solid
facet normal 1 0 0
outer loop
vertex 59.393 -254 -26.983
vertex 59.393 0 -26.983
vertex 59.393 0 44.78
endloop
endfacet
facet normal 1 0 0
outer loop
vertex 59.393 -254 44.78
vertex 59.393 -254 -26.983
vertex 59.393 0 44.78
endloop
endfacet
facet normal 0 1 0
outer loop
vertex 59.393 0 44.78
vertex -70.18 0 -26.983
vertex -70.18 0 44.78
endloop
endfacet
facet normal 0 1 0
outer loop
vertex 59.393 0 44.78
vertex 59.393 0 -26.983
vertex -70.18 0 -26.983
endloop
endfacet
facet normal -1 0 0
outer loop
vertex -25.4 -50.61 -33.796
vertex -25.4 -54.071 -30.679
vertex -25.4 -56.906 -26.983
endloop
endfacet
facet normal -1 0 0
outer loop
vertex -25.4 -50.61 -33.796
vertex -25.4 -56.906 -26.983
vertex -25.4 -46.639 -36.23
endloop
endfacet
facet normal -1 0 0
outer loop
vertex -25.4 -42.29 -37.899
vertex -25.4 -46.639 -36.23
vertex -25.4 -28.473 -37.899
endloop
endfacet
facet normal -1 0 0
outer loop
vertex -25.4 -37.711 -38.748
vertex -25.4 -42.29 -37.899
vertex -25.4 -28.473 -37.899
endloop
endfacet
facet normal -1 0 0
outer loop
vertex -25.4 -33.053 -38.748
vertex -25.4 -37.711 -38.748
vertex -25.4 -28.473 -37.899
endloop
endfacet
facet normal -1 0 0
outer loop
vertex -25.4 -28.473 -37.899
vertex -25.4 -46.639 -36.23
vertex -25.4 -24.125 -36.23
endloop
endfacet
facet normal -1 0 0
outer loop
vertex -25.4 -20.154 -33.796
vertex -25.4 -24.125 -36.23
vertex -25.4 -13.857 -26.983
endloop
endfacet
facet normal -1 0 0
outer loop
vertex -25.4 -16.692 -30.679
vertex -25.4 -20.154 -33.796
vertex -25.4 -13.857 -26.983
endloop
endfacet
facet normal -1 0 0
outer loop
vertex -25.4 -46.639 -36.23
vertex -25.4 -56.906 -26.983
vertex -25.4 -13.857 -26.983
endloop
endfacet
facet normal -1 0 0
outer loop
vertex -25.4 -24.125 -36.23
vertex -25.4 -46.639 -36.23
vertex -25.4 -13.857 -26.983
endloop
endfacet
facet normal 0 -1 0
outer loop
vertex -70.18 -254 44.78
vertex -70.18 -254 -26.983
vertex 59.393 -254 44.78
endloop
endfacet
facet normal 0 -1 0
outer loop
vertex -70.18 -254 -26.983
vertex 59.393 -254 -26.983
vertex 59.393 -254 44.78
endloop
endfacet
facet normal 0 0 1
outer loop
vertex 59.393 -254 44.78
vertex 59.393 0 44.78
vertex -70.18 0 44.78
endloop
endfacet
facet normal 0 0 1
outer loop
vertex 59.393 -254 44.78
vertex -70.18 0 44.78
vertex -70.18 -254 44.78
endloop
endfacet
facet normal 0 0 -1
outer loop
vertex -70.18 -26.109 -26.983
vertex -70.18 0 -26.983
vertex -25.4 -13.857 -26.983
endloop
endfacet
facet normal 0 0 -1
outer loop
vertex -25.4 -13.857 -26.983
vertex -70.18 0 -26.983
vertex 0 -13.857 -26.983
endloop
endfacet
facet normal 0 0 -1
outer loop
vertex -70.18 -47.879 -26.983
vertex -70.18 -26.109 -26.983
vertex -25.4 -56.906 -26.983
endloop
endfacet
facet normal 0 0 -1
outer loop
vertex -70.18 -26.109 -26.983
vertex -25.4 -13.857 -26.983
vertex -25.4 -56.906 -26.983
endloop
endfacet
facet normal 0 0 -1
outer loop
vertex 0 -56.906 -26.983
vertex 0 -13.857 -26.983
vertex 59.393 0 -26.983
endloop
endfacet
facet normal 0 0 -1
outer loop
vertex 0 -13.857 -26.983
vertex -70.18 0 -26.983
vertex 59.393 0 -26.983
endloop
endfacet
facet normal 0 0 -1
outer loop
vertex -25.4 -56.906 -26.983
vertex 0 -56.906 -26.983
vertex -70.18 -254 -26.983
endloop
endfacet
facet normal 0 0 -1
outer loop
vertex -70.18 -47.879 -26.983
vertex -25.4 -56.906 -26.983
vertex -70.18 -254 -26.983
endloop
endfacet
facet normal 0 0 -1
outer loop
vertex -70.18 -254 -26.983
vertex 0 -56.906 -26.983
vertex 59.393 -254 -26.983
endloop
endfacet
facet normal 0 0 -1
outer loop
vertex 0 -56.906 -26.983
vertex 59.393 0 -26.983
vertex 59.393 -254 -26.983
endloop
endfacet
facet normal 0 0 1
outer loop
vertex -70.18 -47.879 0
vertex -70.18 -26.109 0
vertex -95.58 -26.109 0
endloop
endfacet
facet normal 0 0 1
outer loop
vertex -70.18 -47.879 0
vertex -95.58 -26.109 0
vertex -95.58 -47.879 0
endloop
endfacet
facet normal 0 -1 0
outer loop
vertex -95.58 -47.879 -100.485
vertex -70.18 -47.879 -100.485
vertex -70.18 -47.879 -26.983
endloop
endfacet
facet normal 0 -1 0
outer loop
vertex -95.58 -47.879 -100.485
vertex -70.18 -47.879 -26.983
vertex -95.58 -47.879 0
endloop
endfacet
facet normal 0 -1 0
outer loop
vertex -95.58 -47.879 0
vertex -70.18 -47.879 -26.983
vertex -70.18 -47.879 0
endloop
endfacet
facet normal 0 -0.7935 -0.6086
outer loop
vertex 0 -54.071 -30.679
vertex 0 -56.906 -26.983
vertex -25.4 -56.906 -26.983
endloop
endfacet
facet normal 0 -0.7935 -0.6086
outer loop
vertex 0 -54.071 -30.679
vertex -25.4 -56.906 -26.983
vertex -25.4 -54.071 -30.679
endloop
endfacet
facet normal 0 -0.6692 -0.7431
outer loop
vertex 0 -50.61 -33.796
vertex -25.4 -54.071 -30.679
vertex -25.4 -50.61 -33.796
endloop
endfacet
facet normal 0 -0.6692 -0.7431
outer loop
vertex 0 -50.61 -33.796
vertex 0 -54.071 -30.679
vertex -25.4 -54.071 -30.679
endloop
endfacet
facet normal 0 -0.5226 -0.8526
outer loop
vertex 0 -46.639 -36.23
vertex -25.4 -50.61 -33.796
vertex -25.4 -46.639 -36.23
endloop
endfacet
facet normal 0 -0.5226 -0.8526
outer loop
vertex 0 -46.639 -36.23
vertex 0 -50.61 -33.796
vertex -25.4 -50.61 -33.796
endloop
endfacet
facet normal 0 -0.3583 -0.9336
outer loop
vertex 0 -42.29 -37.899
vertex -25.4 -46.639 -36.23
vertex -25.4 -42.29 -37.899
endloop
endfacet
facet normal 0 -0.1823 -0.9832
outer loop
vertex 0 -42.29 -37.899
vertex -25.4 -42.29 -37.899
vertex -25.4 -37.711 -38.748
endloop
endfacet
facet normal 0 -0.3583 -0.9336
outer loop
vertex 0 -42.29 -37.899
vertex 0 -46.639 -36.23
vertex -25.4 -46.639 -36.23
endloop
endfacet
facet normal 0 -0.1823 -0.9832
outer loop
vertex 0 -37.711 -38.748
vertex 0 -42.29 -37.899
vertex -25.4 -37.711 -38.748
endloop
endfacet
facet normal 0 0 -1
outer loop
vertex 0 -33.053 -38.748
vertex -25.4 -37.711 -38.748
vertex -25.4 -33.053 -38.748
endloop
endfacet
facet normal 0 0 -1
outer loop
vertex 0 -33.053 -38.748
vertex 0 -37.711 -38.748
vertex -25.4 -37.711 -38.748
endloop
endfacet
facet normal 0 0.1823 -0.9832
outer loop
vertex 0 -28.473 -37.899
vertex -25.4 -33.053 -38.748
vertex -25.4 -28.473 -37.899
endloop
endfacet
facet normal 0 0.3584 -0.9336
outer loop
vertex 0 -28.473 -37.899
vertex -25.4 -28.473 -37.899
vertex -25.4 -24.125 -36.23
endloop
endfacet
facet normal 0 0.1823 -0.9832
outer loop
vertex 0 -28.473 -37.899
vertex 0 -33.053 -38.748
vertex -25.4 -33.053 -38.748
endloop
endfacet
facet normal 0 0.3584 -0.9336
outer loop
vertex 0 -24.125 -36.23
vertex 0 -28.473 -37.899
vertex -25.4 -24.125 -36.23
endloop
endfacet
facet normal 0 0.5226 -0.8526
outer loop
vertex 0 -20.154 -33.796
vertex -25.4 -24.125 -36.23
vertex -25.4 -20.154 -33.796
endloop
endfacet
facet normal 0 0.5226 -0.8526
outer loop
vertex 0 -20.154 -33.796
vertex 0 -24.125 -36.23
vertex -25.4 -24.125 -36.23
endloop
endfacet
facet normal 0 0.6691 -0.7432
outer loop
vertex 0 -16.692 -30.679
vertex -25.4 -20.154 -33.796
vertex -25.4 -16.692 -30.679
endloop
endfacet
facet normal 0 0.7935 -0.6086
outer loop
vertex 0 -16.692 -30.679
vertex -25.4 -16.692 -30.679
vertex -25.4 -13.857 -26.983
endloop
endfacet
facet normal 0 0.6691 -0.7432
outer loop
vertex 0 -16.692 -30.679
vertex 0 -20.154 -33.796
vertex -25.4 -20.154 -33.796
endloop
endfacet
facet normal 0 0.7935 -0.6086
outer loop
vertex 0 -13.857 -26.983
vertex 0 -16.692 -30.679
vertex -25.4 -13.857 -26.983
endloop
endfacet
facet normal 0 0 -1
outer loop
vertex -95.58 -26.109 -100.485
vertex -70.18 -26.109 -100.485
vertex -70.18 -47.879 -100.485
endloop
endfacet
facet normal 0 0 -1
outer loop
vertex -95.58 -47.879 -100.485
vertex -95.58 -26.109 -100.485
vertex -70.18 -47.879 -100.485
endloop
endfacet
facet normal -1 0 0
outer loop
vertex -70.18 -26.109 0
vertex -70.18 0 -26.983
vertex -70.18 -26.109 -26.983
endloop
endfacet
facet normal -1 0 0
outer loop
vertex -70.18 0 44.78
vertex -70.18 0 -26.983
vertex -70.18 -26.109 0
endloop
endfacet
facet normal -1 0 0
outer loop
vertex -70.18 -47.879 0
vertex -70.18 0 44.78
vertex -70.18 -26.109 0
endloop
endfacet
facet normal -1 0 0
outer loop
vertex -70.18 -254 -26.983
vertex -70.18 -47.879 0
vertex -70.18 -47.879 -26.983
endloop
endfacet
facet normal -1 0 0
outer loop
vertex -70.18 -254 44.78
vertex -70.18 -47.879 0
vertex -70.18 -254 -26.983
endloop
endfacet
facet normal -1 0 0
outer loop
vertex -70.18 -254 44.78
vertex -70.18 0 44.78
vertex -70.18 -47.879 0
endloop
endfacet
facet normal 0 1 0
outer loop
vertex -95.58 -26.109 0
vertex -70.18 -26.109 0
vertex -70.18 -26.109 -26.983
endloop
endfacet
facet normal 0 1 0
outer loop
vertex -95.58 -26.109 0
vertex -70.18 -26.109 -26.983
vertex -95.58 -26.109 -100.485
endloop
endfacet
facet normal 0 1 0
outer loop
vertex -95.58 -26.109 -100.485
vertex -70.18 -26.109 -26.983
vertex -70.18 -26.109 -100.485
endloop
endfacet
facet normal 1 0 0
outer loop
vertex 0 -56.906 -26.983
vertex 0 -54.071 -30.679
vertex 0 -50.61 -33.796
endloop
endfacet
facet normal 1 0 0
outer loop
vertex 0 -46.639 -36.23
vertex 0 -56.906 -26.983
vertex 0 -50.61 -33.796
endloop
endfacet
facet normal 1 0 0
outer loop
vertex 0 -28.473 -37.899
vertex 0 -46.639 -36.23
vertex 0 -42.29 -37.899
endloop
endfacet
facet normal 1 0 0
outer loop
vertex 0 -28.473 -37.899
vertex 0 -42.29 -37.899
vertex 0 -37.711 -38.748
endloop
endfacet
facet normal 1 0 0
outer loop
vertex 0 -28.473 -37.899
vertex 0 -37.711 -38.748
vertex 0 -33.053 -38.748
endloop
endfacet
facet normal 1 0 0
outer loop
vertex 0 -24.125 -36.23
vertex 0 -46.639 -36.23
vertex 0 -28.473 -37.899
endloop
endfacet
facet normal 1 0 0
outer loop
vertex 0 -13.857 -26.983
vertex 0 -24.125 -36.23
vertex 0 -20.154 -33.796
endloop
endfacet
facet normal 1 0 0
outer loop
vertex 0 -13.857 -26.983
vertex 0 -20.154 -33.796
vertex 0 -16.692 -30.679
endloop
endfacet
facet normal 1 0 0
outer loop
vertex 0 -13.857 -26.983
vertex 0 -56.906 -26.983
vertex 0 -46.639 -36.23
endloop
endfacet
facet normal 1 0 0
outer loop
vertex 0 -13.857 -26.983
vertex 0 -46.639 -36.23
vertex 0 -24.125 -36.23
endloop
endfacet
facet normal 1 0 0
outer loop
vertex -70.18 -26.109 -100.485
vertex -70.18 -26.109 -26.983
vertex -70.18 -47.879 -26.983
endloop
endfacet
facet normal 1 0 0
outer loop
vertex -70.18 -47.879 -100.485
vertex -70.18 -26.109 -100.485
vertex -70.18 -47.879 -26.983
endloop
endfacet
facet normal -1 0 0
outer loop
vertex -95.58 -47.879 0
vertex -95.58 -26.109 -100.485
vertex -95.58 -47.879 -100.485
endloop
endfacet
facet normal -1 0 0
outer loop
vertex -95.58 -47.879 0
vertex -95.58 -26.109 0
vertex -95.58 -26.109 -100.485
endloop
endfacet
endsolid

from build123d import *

# Parameters (mm, degrees)
F0_W      = 104.1721515357
F0_H      = 71.7630404979
F1_DEPTH  = 254
F1_FACE_W = 254
F1_FACE_H = 71.7630404979
F2_R      = 25.449665143
F2_R_2    = 11.4170803912
F3_DEPTH  = 25.4
F4_W      = 21.7701625079
F4_H      = 73.5019464046
F4_H_2    = 26.9834827632
F5_DEPTH  = 25.4


with BuildPart() as f1:
    # F0 (on Front) → F1 (new body)
    with BuildSketch(Plane.XZ):
        with Locations((7.3065180331, 8.8980374858)):
            Rectangle(F0_W, F0_H)
    extrude(amount=F1_DEPTH)

    # F1_face (on face) + F2 (on Right) → F3 (join)
    with BuildSketch(Plane(origin=(-44.7795577347, -127, 8.8980374858), x_dir=(0, -1, 0), z_dir=(-1, 0, 0))):
        Rectangle(F1_FACE_W, F1_FACE_H)
    with BuildSketch(Plane.YZ):
        with Locations((-35.3816822171, -13.4047763422)):
            Circle(F2_R)
        with Locations((-35.3816822171, -13.4047763422)):
            Circle(F2_R_2, mode=Mode.SUBTRACT)
    extrude(amount=F3_DEPTH, dir=(-1, 0, 0))

    # F4 (on face) → F5 (join)
    with BuildSketch(Plane(origin=(-70.1795577347, 0, 0), x_dir=(0, -1, 0), z_dir=(-1, 0, 0))):
        with Locations((36.9942905381, -63.7344559655)):
            Rectangle(F4_W, F4_H)
        with Locations((36.9942905381, -13.4917413816)):
            Rectangle(F4_W, F4_H_2)
    extrude(amount=F5_DEPTH)


solid = f1.part
